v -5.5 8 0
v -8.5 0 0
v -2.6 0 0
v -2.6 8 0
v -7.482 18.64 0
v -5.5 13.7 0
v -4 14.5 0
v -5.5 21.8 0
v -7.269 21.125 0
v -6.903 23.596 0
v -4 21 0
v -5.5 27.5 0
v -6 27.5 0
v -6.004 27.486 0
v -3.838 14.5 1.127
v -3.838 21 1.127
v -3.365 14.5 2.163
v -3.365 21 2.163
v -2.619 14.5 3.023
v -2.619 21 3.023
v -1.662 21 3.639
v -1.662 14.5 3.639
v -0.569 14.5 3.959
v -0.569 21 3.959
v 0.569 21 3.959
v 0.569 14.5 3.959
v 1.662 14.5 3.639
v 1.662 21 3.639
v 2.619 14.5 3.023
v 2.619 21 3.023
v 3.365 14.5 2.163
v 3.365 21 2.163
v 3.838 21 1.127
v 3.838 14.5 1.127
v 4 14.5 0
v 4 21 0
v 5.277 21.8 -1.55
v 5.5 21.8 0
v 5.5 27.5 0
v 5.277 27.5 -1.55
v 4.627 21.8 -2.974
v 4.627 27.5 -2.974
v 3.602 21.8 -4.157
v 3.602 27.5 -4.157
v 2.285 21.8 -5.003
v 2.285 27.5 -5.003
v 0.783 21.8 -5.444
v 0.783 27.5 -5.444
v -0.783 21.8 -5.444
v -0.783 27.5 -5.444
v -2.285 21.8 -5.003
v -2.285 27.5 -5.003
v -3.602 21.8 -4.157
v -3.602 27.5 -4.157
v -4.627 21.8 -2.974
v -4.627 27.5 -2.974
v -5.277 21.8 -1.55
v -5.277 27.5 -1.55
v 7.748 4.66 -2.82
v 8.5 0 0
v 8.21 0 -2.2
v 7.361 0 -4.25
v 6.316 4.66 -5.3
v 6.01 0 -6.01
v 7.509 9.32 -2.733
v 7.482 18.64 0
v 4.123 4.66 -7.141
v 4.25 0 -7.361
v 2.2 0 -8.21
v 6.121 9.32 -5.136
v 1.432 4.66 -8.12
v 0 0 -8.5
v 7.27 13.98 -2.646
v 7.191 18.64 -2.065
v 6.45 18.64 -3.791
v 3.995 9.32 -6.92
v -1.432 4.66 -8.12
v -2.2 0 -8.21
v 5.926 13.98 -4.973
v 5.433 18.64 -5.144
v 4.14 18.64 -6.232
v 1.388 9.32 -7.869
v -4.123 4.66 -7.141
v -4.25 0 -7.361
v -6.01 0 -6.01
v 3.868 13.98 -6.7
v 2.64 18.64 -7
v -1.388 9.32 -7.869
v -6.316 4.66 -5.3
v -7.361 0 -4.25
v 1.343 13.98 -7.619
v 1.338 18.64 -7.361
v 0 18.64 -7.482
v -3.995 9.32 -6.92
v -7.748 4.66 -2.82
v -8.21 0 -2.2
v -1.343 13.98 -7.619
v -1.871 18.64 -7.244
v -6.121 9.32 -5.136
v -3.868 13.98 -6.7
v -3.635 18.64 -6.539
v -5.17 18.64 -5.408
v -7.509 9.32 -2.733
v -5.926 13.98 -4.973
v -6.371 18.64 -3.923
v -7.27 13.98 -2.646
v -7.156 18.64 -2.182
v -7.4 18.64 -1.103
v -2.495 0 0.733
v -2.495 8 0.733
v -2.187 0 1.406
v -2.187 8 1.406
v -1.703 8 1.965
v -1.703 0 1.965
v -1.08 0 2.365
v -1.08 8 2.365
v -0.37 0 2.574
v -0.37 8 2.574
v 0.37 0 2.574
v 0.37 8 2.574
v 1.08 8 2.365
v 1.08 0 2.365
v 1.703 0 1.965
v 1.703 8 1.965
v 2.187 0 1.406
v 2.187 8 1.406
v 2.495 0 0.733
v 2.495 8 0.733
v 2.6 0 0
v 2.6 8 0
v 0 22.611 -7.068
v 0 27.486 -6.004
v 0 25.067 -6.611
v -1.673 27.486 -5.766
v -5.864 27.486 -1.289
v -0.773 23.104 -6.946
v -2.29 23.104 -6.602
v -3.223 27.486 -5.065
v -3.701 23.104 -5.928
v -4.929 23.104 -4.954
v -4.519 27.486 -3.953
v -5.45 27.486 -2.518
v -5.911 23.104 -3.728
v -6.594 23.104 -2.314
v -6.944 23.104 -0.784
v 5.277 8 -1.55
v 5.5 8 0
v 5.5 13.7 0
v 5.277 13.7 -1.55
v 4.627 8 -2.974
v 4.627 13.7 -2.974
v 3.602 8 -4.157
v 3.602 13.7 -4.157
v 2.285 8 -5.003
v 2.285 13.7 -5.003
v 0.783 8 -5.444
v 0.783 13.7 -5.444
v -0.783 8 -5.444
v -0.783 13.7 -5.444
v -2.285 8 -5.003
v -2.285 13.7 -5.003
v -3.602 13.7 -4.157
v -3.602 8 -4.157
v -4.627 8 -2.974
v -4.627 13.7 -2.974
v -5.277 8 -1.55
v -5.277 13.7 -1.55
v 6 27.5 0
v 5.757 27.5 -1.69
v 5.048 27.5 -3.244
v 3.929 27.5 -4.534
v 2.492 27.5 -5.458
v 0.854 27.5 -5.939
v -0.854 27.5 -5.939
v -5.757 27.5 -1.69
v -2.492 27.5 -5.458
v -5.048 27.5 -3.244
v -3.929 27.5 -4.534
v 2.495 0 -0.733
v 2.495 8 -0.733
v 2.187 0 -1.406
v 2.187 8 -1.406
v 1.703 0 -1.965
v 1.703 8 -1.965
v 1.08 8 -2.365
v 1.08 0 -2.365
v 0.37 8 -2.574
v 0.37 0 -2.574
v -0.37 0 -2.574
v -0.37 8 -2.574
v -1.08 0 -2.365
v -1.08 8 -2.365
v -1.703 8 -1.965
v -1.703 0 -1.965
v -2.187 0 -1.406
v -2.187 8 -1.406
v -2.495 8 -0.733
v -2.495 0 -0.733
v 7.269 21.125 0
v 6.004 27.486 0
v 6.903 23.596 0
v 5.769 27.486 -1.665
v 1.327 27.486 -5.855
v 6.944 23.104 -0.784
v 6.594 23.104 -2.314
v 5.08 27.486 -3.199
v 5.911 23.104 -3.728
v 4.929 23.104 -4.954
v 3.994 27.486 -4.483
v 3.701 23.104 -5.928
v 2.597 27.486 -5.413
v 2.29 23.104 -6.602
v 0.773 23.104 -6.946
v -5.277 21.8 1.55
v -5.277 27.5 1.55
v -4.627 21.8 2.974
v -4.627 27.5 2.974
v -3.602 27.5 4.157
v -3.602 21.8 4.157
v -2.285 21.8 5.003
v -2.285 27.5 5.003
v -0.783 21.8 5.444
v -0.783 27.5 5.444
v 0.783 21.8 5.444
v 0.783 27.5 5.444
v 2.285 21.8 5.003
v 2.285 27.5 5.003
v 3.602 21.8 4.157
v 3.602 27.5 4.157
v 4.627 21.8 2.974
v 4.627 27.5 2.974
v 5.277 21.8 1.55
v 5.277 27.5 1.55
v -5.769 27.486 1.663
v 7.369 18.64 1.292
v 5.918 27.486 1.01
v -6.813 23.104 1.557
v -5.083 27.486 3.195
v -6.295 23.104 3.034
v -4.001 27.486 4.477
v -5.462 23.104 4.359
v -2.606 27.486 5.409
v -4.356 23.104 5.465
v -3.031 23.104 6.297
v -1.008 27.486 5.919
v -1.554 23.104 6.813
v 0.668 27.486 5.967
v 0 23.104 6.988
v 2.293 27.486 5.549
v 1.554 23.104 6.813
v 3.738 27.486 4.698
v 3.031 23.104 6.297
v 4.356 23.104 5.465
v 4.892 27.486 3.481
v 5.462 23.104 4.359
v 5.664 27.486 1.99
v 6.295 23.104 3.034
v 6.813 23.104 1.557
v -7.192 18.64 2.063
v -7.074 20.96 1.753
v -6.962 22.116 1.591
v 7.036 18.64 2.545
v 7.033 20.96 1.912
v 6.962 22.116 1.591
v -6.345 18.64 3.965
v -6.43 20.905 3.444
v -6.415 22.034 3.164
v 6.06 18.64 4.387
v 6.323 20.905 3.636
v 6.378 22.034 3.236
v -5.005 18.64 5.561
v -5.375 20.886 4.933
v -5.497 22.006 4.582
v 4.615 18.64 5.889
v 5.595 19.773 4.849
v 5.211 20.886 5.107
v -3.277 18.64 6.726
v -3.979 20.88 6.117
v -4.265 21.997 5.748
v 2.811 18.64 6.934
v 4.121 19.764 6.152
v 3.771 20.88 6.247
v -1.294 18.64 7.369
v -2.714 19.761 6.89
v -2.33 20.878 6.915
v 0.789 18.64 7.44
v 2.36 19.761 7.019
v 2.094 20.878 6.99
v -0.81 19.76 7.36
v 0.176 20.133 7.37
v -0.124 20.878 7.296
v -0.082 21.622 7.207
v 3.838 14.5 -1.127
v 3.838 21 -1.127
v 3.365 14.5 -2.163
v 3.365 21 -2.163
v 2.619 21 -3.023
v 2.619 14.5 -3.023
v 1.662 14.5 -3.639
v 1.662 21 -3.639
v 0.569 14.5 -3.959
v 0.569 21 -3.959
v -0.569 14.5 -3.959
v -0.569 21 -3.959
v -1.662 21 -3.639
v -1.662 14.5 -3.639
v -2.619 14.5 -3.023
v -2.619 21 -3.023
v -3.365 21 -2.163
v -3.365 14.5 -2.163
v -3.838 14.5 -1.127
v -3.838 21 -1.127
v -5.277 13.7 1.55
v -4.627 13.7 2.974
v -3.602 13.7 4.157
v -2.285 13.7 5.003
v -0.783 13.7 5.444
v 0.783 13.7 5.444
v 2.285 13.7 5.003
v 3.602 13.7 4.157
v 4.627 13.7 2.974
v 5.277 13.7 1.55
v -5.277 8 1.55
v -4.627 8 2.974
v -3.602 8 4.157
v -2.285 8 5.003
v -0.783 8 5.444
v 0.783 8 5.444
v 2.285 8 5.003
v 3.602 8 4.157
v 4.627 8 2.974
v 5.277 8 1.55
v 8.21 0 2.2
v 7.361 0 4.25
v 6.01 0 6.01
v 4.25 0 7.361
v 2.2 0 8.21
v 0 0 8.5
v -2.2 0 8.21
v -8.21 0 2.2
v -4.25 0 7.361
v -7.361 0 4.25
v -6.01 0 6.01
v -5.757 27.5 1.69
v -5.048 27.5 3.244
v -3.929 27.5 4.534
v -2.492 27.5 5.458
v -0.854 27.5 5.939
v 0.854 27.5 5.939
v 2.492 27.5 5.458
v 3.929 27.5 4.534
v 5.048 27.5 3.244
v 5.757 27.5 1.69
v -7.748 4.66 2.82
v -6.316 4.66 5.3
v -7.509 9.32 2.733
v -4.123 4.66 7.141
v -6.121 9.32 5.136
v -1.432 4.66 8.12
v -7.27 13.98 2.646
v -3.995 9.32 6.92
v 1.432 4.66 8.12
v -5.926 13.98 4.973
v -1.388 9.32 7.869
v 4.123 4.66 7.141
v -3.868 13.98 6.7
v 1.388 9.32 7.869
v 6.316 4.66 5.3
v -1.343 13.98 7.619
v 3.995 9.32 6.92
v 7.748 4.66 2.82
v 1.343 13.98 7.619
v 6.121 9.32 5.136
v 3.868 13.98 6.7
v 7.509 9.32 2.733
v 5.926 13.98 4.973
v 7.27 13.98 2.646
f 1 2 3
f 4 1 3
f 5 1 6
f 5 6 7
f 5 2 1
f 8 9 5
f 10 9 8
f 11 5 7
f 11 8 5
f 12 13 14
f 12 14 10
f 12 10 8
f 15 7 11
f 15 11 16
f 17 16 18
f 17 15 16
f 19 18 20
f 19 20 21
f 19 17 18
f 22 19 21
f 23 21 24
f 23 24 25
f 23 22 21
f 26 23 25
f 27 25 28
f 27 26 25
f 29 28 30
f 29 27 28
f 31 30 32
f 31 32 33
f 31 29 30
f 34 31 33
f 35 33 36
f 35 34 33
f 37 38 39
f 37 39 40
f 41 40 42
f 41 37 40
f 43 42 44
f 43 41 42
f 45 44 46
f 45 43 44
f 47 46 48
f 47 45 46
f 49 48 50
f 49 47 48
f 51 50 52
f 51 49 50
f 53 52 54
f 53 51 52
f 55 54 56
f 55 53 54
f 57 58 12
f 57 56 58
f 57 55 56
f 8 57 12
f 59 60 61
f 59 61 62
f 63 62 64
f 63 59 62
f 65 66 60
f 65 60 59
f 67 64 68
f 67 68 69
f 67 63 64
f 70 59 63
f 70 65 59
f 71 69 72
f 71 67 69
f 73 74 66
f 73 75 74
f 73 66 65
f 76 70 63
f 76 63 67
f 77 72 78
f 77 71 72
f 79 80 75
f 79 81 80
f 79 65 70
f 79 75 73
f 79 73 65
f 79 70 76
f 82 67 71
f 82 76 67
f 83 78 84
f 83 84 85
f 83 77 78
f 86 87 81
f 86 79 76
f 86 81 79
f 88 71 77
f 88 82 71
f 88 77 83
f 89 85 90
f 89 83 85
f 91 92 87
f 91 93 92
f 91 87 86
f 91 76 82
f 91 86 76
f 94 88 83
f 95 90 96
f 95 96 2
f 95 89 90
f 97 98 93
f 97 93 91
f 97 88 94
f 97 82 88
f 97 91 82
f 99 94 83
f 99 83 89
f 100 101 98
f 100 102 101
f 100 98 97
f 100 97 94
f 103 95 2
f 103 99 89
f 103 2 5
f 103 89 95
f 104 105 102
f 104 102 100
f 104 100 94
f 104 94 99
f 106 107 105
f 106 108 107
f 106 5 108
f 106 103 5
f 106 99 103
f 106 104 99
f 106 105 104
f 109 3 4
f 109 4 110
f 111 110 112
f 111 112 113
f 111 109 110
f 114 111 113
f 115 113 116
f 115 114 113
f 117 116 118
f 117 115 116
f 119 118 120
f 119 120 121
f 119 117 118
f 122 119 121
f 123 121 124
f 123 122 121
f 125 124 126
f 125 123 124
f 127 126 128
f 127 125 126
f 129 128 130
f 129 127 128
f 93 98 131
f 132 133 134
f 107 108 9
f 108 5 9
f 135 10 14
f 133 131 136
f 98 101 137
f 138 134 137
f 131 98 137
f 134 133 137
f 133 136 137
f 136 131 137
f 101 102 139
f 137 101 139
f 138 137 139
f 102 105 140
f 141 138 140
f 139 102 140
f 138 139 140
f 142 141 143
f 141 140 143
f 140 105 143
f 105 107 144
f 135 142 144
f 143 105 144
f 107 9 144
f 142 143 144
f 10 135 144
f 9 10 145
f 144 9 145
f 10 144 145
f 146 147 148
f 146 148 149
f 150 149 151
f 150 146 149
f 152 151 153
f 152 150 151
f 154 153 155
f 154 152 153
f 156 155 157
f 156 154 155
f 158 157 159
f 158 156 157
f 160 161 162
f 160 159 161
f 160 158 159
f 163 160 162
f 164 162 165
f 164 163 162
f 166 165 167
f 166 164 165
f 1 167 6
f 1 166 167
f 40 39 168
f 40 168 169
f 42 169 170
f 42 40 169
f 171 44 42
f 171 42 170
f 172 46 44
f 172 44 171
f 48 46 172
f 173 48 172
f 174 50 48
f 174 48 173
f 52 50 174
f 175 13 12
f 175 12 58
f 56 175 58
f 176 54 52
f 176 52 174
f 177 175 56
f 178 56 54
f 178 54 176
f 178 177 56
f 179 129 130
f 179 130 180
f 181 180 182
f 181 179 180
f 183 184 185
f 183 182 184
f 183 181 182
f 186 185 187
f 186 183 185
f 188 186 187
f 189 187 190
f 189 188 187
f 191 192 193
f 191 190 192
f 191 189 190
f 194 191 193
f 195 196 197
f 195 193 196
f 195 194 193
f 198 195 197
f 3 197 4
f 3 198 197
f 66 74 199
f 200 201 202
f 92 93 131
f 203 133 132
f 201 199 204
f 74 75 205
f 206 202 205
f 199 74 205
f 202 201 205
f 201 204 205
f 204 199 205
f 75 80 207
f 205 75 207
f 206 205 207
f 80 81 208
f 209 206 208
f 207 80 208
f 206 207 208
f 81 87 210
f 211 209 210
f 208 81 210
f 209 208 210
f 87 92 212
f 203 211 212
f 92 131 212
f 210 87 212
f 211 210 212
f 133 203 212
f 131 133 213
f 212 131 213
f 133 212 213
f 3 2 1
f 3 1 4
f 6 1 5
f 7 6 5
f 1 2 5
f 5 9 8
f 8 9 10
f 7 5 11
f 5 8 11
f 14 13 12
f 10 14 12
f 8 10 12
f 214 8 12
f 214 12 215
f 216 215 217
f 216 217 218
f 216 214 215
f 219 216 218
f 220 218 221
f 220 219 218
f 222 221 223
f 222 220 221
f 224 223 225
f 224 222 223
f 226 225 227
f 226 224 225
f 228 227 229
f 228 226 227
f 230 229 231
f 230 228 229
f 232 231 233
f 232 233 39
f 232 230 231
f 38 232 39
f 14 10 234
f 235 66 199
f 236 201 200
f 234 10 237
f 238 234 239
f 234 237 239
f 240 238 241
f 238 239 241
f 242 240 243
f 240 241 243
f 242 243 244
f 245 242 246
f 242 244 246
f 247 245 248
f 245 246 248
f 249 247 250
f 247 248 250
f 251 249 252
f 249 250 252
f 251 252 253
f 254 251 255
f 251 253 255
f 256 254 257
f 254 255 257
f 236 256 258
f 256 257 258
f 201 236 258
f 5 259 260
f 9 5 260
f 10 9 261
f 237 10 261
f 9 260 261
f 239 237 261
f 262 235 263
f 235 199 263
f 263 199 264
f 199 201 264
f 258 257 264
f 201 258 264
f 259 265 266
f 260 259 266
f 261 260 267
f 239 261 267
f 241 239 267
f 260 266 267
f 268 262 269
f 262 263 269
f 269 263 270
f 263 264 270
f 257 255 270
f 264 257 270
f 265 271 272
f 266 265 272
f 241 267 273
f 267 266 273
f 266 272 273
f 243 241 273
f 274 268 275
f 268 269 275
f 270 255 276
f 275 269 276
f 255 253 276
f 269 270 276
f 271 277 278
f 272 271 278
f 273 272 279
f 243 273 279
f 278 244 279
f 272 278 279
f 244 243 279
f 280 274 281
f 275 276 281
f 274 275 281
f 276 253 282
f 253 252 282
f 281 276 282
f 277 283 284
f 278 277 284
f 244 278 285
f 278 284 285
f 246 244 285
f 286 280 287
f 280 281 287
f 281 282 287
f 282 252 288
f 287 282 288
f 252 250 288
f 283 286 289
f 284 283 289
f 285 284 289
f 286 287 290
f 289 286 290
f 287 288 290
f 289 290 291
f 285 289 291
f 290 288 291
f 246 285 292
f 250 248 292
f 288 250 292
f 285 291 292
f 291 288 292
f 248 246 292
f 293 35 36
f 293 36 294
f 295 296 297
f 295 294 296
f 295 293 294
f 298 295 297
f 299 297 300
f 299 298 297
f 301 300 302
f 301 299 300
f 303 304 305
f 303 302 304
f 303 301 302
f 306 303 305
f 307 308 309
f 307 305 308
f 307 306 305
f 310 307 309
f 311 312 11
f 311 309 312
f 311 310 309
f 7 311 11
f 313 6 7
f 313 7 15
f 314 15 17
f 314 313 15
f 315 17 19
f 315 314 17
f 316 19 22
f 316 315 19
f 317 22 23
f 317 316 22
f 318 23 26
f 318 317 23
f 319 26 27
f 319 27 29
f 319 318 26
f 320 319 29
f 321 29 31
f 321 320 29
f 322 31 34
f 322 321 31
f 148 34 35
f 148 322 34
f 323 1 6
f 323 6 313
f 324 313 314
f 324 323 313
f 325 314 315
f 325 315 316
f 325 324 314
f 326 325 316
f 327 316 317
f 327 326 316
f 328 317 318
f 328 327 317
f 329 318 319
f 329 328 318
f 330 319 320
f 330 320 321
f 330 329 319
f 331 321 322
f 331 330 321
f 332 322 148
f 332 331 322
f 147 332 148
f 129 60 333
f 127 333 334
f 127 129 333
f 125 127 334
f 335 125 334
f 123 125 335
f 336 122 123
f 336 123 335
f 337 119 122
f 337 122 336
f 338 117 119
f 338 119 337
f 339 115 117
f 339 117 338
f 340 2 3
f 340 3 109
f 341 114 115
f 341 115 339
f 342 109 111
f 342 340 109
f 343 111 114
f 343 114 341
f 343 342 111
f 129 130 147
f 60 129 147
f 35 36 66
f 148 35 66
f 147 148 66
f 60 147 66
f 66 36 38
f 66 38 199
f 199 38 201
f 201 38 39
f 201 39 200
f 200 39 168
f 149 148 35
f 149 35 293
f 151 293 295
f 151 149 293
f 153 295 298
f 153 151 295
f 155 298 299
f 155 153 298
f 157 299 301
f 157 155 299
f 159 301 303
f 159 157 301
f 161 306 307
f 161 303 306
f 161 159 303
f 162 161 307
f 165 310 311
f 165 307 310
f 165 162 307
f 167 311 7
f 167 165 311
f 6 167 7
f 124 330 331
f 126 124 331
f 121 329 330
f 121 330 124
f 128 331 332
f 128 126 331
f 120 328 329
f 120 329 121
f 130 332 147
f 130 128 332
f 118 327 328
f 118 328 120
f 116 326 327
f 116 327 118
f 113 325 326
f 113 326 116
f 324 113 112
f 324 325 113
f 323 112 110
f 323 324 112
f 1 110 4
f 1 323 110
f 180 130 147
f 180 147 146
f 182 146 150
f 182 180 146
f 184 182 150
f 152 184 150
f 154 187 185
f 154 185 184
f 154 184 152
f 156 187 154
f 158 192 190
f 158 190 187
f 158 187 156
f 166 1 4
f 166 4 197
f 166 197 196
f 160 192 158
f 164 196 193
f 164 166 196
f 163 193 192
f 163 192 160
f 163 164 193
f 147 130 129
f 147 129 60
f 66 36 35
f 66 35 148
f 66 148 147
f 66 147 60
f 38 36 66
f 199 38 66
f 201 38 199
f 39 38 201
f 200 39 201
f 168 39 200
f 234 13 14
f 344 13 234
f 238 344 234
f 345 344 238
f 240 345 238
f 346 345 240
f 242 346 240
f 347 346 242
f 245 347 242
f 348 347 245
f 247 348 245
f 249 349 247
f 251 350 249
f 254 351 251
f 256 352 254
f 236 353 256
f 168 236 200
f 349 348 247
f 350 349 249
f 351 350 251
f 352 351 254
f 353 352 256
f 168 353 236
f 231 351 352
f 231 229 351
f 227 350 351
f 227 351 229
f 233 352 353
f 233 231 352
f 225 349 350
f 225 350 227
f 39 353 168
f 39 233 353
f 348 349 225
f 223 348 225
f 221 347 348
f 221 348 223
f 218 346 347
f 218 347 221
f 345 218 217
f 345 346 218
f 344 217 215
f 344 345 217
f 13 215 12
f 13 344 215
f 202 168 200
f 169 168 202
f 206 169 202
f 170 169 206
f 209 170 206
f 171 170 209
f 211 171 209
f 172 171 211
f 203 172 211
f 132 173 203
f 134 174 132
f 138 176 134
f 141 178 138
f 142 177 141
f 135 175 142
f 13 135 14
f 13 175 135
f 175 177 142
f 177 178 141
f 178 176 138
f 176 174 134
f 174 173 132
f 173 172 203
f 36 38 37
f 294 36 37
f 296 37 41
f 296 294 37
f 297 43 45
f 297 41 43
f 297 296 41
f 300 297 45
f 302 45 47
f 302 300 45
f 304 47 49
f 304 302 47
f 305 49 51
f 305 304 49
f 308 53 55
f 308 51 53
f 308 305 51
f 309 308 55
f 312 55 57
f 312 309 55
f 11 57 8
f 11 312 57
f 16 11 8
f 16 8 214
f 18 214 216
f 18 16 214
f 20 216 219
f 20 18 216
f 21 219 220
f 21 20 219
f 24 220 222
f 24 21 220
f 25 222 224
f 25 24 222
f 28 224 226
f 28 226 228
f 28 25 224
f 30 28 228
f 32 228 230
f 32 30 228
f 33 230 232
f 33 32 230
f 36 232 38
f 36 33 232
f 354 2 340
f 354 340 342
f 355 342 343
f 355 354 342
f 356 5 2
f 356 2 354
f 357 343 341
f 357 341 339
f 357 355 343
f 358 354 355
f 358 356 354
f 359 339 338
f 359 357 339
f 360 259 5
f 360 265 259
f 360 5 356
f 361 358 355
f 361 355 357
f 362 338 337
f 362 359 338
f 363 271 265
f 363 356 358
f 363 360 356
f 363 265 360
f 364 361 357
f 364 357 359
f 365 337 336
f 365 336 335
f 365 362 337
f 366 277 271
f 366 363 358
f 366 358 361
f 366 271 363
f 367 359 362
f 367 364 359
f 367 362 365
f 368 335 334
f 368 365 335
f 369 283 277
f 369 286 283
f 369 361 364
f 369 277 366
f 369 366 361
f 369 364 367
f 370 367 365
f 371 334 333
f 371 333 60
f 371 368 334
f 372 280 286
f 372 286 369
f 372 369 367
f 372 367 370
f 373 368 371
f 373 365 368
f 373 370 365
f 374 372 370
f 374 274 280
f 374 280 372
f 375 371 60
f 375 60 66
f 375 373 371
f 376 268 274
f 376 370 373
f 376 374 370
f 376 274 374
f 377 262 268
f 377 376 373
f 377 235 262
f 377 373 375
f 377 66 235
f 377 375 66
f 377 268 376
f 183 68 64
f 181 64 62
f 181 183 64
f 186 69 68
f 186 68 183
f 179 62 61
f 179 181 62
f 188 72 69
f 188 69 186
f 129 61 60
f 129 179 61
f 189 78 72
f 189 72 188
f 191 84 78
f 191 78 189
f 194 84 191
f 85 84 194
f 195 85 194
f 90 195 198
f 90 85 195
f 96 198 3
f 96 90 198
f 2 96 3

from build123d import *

# Parameters (mm, degrees)
FILLET1_R = 40.5


with BuildPart() as part:
    # Sketch1 → Revolve1 (revolve)
    with BuildSketch(Plane(origin=(0, 0, 0), x_dir=(0, 0, -1), z_dir=(1, 0, 0))):
        Polygon((2.6, 0), (8.5, 0), (7.235571744, 23.145355256), (6, 27.5), (5.5, 27.5), (5.5, 21.8), (4, 21), (4, 14.5), (5.5, 13.7), (5.5, 8), (2.6, 8), align=None)
    revolve(axis=Axis((0, 0, 0), (0, 1, 0)))

    # Fillet1
    fillet1_edges = [part.edges().sort_by_distance(p)[0] for p in [
        (0, 23.145355256, 7.235571744),
    ]]
    fillet(fillet1_edges, radius=FILLET1_R)


with BuildPart() as body_2:
    # Split1: the piece on the far side of the plane
    add(part.part)
    split(bisect_by=Plane.XY, keep=Keep.BOTTOM)


with BuildPart() as part_1:
    add(part.part)

    # Split1
    split(bisect_by=Plane.XY, keep=Keep.TOP)


solid = Compound([body_2.part, part_1.part])
